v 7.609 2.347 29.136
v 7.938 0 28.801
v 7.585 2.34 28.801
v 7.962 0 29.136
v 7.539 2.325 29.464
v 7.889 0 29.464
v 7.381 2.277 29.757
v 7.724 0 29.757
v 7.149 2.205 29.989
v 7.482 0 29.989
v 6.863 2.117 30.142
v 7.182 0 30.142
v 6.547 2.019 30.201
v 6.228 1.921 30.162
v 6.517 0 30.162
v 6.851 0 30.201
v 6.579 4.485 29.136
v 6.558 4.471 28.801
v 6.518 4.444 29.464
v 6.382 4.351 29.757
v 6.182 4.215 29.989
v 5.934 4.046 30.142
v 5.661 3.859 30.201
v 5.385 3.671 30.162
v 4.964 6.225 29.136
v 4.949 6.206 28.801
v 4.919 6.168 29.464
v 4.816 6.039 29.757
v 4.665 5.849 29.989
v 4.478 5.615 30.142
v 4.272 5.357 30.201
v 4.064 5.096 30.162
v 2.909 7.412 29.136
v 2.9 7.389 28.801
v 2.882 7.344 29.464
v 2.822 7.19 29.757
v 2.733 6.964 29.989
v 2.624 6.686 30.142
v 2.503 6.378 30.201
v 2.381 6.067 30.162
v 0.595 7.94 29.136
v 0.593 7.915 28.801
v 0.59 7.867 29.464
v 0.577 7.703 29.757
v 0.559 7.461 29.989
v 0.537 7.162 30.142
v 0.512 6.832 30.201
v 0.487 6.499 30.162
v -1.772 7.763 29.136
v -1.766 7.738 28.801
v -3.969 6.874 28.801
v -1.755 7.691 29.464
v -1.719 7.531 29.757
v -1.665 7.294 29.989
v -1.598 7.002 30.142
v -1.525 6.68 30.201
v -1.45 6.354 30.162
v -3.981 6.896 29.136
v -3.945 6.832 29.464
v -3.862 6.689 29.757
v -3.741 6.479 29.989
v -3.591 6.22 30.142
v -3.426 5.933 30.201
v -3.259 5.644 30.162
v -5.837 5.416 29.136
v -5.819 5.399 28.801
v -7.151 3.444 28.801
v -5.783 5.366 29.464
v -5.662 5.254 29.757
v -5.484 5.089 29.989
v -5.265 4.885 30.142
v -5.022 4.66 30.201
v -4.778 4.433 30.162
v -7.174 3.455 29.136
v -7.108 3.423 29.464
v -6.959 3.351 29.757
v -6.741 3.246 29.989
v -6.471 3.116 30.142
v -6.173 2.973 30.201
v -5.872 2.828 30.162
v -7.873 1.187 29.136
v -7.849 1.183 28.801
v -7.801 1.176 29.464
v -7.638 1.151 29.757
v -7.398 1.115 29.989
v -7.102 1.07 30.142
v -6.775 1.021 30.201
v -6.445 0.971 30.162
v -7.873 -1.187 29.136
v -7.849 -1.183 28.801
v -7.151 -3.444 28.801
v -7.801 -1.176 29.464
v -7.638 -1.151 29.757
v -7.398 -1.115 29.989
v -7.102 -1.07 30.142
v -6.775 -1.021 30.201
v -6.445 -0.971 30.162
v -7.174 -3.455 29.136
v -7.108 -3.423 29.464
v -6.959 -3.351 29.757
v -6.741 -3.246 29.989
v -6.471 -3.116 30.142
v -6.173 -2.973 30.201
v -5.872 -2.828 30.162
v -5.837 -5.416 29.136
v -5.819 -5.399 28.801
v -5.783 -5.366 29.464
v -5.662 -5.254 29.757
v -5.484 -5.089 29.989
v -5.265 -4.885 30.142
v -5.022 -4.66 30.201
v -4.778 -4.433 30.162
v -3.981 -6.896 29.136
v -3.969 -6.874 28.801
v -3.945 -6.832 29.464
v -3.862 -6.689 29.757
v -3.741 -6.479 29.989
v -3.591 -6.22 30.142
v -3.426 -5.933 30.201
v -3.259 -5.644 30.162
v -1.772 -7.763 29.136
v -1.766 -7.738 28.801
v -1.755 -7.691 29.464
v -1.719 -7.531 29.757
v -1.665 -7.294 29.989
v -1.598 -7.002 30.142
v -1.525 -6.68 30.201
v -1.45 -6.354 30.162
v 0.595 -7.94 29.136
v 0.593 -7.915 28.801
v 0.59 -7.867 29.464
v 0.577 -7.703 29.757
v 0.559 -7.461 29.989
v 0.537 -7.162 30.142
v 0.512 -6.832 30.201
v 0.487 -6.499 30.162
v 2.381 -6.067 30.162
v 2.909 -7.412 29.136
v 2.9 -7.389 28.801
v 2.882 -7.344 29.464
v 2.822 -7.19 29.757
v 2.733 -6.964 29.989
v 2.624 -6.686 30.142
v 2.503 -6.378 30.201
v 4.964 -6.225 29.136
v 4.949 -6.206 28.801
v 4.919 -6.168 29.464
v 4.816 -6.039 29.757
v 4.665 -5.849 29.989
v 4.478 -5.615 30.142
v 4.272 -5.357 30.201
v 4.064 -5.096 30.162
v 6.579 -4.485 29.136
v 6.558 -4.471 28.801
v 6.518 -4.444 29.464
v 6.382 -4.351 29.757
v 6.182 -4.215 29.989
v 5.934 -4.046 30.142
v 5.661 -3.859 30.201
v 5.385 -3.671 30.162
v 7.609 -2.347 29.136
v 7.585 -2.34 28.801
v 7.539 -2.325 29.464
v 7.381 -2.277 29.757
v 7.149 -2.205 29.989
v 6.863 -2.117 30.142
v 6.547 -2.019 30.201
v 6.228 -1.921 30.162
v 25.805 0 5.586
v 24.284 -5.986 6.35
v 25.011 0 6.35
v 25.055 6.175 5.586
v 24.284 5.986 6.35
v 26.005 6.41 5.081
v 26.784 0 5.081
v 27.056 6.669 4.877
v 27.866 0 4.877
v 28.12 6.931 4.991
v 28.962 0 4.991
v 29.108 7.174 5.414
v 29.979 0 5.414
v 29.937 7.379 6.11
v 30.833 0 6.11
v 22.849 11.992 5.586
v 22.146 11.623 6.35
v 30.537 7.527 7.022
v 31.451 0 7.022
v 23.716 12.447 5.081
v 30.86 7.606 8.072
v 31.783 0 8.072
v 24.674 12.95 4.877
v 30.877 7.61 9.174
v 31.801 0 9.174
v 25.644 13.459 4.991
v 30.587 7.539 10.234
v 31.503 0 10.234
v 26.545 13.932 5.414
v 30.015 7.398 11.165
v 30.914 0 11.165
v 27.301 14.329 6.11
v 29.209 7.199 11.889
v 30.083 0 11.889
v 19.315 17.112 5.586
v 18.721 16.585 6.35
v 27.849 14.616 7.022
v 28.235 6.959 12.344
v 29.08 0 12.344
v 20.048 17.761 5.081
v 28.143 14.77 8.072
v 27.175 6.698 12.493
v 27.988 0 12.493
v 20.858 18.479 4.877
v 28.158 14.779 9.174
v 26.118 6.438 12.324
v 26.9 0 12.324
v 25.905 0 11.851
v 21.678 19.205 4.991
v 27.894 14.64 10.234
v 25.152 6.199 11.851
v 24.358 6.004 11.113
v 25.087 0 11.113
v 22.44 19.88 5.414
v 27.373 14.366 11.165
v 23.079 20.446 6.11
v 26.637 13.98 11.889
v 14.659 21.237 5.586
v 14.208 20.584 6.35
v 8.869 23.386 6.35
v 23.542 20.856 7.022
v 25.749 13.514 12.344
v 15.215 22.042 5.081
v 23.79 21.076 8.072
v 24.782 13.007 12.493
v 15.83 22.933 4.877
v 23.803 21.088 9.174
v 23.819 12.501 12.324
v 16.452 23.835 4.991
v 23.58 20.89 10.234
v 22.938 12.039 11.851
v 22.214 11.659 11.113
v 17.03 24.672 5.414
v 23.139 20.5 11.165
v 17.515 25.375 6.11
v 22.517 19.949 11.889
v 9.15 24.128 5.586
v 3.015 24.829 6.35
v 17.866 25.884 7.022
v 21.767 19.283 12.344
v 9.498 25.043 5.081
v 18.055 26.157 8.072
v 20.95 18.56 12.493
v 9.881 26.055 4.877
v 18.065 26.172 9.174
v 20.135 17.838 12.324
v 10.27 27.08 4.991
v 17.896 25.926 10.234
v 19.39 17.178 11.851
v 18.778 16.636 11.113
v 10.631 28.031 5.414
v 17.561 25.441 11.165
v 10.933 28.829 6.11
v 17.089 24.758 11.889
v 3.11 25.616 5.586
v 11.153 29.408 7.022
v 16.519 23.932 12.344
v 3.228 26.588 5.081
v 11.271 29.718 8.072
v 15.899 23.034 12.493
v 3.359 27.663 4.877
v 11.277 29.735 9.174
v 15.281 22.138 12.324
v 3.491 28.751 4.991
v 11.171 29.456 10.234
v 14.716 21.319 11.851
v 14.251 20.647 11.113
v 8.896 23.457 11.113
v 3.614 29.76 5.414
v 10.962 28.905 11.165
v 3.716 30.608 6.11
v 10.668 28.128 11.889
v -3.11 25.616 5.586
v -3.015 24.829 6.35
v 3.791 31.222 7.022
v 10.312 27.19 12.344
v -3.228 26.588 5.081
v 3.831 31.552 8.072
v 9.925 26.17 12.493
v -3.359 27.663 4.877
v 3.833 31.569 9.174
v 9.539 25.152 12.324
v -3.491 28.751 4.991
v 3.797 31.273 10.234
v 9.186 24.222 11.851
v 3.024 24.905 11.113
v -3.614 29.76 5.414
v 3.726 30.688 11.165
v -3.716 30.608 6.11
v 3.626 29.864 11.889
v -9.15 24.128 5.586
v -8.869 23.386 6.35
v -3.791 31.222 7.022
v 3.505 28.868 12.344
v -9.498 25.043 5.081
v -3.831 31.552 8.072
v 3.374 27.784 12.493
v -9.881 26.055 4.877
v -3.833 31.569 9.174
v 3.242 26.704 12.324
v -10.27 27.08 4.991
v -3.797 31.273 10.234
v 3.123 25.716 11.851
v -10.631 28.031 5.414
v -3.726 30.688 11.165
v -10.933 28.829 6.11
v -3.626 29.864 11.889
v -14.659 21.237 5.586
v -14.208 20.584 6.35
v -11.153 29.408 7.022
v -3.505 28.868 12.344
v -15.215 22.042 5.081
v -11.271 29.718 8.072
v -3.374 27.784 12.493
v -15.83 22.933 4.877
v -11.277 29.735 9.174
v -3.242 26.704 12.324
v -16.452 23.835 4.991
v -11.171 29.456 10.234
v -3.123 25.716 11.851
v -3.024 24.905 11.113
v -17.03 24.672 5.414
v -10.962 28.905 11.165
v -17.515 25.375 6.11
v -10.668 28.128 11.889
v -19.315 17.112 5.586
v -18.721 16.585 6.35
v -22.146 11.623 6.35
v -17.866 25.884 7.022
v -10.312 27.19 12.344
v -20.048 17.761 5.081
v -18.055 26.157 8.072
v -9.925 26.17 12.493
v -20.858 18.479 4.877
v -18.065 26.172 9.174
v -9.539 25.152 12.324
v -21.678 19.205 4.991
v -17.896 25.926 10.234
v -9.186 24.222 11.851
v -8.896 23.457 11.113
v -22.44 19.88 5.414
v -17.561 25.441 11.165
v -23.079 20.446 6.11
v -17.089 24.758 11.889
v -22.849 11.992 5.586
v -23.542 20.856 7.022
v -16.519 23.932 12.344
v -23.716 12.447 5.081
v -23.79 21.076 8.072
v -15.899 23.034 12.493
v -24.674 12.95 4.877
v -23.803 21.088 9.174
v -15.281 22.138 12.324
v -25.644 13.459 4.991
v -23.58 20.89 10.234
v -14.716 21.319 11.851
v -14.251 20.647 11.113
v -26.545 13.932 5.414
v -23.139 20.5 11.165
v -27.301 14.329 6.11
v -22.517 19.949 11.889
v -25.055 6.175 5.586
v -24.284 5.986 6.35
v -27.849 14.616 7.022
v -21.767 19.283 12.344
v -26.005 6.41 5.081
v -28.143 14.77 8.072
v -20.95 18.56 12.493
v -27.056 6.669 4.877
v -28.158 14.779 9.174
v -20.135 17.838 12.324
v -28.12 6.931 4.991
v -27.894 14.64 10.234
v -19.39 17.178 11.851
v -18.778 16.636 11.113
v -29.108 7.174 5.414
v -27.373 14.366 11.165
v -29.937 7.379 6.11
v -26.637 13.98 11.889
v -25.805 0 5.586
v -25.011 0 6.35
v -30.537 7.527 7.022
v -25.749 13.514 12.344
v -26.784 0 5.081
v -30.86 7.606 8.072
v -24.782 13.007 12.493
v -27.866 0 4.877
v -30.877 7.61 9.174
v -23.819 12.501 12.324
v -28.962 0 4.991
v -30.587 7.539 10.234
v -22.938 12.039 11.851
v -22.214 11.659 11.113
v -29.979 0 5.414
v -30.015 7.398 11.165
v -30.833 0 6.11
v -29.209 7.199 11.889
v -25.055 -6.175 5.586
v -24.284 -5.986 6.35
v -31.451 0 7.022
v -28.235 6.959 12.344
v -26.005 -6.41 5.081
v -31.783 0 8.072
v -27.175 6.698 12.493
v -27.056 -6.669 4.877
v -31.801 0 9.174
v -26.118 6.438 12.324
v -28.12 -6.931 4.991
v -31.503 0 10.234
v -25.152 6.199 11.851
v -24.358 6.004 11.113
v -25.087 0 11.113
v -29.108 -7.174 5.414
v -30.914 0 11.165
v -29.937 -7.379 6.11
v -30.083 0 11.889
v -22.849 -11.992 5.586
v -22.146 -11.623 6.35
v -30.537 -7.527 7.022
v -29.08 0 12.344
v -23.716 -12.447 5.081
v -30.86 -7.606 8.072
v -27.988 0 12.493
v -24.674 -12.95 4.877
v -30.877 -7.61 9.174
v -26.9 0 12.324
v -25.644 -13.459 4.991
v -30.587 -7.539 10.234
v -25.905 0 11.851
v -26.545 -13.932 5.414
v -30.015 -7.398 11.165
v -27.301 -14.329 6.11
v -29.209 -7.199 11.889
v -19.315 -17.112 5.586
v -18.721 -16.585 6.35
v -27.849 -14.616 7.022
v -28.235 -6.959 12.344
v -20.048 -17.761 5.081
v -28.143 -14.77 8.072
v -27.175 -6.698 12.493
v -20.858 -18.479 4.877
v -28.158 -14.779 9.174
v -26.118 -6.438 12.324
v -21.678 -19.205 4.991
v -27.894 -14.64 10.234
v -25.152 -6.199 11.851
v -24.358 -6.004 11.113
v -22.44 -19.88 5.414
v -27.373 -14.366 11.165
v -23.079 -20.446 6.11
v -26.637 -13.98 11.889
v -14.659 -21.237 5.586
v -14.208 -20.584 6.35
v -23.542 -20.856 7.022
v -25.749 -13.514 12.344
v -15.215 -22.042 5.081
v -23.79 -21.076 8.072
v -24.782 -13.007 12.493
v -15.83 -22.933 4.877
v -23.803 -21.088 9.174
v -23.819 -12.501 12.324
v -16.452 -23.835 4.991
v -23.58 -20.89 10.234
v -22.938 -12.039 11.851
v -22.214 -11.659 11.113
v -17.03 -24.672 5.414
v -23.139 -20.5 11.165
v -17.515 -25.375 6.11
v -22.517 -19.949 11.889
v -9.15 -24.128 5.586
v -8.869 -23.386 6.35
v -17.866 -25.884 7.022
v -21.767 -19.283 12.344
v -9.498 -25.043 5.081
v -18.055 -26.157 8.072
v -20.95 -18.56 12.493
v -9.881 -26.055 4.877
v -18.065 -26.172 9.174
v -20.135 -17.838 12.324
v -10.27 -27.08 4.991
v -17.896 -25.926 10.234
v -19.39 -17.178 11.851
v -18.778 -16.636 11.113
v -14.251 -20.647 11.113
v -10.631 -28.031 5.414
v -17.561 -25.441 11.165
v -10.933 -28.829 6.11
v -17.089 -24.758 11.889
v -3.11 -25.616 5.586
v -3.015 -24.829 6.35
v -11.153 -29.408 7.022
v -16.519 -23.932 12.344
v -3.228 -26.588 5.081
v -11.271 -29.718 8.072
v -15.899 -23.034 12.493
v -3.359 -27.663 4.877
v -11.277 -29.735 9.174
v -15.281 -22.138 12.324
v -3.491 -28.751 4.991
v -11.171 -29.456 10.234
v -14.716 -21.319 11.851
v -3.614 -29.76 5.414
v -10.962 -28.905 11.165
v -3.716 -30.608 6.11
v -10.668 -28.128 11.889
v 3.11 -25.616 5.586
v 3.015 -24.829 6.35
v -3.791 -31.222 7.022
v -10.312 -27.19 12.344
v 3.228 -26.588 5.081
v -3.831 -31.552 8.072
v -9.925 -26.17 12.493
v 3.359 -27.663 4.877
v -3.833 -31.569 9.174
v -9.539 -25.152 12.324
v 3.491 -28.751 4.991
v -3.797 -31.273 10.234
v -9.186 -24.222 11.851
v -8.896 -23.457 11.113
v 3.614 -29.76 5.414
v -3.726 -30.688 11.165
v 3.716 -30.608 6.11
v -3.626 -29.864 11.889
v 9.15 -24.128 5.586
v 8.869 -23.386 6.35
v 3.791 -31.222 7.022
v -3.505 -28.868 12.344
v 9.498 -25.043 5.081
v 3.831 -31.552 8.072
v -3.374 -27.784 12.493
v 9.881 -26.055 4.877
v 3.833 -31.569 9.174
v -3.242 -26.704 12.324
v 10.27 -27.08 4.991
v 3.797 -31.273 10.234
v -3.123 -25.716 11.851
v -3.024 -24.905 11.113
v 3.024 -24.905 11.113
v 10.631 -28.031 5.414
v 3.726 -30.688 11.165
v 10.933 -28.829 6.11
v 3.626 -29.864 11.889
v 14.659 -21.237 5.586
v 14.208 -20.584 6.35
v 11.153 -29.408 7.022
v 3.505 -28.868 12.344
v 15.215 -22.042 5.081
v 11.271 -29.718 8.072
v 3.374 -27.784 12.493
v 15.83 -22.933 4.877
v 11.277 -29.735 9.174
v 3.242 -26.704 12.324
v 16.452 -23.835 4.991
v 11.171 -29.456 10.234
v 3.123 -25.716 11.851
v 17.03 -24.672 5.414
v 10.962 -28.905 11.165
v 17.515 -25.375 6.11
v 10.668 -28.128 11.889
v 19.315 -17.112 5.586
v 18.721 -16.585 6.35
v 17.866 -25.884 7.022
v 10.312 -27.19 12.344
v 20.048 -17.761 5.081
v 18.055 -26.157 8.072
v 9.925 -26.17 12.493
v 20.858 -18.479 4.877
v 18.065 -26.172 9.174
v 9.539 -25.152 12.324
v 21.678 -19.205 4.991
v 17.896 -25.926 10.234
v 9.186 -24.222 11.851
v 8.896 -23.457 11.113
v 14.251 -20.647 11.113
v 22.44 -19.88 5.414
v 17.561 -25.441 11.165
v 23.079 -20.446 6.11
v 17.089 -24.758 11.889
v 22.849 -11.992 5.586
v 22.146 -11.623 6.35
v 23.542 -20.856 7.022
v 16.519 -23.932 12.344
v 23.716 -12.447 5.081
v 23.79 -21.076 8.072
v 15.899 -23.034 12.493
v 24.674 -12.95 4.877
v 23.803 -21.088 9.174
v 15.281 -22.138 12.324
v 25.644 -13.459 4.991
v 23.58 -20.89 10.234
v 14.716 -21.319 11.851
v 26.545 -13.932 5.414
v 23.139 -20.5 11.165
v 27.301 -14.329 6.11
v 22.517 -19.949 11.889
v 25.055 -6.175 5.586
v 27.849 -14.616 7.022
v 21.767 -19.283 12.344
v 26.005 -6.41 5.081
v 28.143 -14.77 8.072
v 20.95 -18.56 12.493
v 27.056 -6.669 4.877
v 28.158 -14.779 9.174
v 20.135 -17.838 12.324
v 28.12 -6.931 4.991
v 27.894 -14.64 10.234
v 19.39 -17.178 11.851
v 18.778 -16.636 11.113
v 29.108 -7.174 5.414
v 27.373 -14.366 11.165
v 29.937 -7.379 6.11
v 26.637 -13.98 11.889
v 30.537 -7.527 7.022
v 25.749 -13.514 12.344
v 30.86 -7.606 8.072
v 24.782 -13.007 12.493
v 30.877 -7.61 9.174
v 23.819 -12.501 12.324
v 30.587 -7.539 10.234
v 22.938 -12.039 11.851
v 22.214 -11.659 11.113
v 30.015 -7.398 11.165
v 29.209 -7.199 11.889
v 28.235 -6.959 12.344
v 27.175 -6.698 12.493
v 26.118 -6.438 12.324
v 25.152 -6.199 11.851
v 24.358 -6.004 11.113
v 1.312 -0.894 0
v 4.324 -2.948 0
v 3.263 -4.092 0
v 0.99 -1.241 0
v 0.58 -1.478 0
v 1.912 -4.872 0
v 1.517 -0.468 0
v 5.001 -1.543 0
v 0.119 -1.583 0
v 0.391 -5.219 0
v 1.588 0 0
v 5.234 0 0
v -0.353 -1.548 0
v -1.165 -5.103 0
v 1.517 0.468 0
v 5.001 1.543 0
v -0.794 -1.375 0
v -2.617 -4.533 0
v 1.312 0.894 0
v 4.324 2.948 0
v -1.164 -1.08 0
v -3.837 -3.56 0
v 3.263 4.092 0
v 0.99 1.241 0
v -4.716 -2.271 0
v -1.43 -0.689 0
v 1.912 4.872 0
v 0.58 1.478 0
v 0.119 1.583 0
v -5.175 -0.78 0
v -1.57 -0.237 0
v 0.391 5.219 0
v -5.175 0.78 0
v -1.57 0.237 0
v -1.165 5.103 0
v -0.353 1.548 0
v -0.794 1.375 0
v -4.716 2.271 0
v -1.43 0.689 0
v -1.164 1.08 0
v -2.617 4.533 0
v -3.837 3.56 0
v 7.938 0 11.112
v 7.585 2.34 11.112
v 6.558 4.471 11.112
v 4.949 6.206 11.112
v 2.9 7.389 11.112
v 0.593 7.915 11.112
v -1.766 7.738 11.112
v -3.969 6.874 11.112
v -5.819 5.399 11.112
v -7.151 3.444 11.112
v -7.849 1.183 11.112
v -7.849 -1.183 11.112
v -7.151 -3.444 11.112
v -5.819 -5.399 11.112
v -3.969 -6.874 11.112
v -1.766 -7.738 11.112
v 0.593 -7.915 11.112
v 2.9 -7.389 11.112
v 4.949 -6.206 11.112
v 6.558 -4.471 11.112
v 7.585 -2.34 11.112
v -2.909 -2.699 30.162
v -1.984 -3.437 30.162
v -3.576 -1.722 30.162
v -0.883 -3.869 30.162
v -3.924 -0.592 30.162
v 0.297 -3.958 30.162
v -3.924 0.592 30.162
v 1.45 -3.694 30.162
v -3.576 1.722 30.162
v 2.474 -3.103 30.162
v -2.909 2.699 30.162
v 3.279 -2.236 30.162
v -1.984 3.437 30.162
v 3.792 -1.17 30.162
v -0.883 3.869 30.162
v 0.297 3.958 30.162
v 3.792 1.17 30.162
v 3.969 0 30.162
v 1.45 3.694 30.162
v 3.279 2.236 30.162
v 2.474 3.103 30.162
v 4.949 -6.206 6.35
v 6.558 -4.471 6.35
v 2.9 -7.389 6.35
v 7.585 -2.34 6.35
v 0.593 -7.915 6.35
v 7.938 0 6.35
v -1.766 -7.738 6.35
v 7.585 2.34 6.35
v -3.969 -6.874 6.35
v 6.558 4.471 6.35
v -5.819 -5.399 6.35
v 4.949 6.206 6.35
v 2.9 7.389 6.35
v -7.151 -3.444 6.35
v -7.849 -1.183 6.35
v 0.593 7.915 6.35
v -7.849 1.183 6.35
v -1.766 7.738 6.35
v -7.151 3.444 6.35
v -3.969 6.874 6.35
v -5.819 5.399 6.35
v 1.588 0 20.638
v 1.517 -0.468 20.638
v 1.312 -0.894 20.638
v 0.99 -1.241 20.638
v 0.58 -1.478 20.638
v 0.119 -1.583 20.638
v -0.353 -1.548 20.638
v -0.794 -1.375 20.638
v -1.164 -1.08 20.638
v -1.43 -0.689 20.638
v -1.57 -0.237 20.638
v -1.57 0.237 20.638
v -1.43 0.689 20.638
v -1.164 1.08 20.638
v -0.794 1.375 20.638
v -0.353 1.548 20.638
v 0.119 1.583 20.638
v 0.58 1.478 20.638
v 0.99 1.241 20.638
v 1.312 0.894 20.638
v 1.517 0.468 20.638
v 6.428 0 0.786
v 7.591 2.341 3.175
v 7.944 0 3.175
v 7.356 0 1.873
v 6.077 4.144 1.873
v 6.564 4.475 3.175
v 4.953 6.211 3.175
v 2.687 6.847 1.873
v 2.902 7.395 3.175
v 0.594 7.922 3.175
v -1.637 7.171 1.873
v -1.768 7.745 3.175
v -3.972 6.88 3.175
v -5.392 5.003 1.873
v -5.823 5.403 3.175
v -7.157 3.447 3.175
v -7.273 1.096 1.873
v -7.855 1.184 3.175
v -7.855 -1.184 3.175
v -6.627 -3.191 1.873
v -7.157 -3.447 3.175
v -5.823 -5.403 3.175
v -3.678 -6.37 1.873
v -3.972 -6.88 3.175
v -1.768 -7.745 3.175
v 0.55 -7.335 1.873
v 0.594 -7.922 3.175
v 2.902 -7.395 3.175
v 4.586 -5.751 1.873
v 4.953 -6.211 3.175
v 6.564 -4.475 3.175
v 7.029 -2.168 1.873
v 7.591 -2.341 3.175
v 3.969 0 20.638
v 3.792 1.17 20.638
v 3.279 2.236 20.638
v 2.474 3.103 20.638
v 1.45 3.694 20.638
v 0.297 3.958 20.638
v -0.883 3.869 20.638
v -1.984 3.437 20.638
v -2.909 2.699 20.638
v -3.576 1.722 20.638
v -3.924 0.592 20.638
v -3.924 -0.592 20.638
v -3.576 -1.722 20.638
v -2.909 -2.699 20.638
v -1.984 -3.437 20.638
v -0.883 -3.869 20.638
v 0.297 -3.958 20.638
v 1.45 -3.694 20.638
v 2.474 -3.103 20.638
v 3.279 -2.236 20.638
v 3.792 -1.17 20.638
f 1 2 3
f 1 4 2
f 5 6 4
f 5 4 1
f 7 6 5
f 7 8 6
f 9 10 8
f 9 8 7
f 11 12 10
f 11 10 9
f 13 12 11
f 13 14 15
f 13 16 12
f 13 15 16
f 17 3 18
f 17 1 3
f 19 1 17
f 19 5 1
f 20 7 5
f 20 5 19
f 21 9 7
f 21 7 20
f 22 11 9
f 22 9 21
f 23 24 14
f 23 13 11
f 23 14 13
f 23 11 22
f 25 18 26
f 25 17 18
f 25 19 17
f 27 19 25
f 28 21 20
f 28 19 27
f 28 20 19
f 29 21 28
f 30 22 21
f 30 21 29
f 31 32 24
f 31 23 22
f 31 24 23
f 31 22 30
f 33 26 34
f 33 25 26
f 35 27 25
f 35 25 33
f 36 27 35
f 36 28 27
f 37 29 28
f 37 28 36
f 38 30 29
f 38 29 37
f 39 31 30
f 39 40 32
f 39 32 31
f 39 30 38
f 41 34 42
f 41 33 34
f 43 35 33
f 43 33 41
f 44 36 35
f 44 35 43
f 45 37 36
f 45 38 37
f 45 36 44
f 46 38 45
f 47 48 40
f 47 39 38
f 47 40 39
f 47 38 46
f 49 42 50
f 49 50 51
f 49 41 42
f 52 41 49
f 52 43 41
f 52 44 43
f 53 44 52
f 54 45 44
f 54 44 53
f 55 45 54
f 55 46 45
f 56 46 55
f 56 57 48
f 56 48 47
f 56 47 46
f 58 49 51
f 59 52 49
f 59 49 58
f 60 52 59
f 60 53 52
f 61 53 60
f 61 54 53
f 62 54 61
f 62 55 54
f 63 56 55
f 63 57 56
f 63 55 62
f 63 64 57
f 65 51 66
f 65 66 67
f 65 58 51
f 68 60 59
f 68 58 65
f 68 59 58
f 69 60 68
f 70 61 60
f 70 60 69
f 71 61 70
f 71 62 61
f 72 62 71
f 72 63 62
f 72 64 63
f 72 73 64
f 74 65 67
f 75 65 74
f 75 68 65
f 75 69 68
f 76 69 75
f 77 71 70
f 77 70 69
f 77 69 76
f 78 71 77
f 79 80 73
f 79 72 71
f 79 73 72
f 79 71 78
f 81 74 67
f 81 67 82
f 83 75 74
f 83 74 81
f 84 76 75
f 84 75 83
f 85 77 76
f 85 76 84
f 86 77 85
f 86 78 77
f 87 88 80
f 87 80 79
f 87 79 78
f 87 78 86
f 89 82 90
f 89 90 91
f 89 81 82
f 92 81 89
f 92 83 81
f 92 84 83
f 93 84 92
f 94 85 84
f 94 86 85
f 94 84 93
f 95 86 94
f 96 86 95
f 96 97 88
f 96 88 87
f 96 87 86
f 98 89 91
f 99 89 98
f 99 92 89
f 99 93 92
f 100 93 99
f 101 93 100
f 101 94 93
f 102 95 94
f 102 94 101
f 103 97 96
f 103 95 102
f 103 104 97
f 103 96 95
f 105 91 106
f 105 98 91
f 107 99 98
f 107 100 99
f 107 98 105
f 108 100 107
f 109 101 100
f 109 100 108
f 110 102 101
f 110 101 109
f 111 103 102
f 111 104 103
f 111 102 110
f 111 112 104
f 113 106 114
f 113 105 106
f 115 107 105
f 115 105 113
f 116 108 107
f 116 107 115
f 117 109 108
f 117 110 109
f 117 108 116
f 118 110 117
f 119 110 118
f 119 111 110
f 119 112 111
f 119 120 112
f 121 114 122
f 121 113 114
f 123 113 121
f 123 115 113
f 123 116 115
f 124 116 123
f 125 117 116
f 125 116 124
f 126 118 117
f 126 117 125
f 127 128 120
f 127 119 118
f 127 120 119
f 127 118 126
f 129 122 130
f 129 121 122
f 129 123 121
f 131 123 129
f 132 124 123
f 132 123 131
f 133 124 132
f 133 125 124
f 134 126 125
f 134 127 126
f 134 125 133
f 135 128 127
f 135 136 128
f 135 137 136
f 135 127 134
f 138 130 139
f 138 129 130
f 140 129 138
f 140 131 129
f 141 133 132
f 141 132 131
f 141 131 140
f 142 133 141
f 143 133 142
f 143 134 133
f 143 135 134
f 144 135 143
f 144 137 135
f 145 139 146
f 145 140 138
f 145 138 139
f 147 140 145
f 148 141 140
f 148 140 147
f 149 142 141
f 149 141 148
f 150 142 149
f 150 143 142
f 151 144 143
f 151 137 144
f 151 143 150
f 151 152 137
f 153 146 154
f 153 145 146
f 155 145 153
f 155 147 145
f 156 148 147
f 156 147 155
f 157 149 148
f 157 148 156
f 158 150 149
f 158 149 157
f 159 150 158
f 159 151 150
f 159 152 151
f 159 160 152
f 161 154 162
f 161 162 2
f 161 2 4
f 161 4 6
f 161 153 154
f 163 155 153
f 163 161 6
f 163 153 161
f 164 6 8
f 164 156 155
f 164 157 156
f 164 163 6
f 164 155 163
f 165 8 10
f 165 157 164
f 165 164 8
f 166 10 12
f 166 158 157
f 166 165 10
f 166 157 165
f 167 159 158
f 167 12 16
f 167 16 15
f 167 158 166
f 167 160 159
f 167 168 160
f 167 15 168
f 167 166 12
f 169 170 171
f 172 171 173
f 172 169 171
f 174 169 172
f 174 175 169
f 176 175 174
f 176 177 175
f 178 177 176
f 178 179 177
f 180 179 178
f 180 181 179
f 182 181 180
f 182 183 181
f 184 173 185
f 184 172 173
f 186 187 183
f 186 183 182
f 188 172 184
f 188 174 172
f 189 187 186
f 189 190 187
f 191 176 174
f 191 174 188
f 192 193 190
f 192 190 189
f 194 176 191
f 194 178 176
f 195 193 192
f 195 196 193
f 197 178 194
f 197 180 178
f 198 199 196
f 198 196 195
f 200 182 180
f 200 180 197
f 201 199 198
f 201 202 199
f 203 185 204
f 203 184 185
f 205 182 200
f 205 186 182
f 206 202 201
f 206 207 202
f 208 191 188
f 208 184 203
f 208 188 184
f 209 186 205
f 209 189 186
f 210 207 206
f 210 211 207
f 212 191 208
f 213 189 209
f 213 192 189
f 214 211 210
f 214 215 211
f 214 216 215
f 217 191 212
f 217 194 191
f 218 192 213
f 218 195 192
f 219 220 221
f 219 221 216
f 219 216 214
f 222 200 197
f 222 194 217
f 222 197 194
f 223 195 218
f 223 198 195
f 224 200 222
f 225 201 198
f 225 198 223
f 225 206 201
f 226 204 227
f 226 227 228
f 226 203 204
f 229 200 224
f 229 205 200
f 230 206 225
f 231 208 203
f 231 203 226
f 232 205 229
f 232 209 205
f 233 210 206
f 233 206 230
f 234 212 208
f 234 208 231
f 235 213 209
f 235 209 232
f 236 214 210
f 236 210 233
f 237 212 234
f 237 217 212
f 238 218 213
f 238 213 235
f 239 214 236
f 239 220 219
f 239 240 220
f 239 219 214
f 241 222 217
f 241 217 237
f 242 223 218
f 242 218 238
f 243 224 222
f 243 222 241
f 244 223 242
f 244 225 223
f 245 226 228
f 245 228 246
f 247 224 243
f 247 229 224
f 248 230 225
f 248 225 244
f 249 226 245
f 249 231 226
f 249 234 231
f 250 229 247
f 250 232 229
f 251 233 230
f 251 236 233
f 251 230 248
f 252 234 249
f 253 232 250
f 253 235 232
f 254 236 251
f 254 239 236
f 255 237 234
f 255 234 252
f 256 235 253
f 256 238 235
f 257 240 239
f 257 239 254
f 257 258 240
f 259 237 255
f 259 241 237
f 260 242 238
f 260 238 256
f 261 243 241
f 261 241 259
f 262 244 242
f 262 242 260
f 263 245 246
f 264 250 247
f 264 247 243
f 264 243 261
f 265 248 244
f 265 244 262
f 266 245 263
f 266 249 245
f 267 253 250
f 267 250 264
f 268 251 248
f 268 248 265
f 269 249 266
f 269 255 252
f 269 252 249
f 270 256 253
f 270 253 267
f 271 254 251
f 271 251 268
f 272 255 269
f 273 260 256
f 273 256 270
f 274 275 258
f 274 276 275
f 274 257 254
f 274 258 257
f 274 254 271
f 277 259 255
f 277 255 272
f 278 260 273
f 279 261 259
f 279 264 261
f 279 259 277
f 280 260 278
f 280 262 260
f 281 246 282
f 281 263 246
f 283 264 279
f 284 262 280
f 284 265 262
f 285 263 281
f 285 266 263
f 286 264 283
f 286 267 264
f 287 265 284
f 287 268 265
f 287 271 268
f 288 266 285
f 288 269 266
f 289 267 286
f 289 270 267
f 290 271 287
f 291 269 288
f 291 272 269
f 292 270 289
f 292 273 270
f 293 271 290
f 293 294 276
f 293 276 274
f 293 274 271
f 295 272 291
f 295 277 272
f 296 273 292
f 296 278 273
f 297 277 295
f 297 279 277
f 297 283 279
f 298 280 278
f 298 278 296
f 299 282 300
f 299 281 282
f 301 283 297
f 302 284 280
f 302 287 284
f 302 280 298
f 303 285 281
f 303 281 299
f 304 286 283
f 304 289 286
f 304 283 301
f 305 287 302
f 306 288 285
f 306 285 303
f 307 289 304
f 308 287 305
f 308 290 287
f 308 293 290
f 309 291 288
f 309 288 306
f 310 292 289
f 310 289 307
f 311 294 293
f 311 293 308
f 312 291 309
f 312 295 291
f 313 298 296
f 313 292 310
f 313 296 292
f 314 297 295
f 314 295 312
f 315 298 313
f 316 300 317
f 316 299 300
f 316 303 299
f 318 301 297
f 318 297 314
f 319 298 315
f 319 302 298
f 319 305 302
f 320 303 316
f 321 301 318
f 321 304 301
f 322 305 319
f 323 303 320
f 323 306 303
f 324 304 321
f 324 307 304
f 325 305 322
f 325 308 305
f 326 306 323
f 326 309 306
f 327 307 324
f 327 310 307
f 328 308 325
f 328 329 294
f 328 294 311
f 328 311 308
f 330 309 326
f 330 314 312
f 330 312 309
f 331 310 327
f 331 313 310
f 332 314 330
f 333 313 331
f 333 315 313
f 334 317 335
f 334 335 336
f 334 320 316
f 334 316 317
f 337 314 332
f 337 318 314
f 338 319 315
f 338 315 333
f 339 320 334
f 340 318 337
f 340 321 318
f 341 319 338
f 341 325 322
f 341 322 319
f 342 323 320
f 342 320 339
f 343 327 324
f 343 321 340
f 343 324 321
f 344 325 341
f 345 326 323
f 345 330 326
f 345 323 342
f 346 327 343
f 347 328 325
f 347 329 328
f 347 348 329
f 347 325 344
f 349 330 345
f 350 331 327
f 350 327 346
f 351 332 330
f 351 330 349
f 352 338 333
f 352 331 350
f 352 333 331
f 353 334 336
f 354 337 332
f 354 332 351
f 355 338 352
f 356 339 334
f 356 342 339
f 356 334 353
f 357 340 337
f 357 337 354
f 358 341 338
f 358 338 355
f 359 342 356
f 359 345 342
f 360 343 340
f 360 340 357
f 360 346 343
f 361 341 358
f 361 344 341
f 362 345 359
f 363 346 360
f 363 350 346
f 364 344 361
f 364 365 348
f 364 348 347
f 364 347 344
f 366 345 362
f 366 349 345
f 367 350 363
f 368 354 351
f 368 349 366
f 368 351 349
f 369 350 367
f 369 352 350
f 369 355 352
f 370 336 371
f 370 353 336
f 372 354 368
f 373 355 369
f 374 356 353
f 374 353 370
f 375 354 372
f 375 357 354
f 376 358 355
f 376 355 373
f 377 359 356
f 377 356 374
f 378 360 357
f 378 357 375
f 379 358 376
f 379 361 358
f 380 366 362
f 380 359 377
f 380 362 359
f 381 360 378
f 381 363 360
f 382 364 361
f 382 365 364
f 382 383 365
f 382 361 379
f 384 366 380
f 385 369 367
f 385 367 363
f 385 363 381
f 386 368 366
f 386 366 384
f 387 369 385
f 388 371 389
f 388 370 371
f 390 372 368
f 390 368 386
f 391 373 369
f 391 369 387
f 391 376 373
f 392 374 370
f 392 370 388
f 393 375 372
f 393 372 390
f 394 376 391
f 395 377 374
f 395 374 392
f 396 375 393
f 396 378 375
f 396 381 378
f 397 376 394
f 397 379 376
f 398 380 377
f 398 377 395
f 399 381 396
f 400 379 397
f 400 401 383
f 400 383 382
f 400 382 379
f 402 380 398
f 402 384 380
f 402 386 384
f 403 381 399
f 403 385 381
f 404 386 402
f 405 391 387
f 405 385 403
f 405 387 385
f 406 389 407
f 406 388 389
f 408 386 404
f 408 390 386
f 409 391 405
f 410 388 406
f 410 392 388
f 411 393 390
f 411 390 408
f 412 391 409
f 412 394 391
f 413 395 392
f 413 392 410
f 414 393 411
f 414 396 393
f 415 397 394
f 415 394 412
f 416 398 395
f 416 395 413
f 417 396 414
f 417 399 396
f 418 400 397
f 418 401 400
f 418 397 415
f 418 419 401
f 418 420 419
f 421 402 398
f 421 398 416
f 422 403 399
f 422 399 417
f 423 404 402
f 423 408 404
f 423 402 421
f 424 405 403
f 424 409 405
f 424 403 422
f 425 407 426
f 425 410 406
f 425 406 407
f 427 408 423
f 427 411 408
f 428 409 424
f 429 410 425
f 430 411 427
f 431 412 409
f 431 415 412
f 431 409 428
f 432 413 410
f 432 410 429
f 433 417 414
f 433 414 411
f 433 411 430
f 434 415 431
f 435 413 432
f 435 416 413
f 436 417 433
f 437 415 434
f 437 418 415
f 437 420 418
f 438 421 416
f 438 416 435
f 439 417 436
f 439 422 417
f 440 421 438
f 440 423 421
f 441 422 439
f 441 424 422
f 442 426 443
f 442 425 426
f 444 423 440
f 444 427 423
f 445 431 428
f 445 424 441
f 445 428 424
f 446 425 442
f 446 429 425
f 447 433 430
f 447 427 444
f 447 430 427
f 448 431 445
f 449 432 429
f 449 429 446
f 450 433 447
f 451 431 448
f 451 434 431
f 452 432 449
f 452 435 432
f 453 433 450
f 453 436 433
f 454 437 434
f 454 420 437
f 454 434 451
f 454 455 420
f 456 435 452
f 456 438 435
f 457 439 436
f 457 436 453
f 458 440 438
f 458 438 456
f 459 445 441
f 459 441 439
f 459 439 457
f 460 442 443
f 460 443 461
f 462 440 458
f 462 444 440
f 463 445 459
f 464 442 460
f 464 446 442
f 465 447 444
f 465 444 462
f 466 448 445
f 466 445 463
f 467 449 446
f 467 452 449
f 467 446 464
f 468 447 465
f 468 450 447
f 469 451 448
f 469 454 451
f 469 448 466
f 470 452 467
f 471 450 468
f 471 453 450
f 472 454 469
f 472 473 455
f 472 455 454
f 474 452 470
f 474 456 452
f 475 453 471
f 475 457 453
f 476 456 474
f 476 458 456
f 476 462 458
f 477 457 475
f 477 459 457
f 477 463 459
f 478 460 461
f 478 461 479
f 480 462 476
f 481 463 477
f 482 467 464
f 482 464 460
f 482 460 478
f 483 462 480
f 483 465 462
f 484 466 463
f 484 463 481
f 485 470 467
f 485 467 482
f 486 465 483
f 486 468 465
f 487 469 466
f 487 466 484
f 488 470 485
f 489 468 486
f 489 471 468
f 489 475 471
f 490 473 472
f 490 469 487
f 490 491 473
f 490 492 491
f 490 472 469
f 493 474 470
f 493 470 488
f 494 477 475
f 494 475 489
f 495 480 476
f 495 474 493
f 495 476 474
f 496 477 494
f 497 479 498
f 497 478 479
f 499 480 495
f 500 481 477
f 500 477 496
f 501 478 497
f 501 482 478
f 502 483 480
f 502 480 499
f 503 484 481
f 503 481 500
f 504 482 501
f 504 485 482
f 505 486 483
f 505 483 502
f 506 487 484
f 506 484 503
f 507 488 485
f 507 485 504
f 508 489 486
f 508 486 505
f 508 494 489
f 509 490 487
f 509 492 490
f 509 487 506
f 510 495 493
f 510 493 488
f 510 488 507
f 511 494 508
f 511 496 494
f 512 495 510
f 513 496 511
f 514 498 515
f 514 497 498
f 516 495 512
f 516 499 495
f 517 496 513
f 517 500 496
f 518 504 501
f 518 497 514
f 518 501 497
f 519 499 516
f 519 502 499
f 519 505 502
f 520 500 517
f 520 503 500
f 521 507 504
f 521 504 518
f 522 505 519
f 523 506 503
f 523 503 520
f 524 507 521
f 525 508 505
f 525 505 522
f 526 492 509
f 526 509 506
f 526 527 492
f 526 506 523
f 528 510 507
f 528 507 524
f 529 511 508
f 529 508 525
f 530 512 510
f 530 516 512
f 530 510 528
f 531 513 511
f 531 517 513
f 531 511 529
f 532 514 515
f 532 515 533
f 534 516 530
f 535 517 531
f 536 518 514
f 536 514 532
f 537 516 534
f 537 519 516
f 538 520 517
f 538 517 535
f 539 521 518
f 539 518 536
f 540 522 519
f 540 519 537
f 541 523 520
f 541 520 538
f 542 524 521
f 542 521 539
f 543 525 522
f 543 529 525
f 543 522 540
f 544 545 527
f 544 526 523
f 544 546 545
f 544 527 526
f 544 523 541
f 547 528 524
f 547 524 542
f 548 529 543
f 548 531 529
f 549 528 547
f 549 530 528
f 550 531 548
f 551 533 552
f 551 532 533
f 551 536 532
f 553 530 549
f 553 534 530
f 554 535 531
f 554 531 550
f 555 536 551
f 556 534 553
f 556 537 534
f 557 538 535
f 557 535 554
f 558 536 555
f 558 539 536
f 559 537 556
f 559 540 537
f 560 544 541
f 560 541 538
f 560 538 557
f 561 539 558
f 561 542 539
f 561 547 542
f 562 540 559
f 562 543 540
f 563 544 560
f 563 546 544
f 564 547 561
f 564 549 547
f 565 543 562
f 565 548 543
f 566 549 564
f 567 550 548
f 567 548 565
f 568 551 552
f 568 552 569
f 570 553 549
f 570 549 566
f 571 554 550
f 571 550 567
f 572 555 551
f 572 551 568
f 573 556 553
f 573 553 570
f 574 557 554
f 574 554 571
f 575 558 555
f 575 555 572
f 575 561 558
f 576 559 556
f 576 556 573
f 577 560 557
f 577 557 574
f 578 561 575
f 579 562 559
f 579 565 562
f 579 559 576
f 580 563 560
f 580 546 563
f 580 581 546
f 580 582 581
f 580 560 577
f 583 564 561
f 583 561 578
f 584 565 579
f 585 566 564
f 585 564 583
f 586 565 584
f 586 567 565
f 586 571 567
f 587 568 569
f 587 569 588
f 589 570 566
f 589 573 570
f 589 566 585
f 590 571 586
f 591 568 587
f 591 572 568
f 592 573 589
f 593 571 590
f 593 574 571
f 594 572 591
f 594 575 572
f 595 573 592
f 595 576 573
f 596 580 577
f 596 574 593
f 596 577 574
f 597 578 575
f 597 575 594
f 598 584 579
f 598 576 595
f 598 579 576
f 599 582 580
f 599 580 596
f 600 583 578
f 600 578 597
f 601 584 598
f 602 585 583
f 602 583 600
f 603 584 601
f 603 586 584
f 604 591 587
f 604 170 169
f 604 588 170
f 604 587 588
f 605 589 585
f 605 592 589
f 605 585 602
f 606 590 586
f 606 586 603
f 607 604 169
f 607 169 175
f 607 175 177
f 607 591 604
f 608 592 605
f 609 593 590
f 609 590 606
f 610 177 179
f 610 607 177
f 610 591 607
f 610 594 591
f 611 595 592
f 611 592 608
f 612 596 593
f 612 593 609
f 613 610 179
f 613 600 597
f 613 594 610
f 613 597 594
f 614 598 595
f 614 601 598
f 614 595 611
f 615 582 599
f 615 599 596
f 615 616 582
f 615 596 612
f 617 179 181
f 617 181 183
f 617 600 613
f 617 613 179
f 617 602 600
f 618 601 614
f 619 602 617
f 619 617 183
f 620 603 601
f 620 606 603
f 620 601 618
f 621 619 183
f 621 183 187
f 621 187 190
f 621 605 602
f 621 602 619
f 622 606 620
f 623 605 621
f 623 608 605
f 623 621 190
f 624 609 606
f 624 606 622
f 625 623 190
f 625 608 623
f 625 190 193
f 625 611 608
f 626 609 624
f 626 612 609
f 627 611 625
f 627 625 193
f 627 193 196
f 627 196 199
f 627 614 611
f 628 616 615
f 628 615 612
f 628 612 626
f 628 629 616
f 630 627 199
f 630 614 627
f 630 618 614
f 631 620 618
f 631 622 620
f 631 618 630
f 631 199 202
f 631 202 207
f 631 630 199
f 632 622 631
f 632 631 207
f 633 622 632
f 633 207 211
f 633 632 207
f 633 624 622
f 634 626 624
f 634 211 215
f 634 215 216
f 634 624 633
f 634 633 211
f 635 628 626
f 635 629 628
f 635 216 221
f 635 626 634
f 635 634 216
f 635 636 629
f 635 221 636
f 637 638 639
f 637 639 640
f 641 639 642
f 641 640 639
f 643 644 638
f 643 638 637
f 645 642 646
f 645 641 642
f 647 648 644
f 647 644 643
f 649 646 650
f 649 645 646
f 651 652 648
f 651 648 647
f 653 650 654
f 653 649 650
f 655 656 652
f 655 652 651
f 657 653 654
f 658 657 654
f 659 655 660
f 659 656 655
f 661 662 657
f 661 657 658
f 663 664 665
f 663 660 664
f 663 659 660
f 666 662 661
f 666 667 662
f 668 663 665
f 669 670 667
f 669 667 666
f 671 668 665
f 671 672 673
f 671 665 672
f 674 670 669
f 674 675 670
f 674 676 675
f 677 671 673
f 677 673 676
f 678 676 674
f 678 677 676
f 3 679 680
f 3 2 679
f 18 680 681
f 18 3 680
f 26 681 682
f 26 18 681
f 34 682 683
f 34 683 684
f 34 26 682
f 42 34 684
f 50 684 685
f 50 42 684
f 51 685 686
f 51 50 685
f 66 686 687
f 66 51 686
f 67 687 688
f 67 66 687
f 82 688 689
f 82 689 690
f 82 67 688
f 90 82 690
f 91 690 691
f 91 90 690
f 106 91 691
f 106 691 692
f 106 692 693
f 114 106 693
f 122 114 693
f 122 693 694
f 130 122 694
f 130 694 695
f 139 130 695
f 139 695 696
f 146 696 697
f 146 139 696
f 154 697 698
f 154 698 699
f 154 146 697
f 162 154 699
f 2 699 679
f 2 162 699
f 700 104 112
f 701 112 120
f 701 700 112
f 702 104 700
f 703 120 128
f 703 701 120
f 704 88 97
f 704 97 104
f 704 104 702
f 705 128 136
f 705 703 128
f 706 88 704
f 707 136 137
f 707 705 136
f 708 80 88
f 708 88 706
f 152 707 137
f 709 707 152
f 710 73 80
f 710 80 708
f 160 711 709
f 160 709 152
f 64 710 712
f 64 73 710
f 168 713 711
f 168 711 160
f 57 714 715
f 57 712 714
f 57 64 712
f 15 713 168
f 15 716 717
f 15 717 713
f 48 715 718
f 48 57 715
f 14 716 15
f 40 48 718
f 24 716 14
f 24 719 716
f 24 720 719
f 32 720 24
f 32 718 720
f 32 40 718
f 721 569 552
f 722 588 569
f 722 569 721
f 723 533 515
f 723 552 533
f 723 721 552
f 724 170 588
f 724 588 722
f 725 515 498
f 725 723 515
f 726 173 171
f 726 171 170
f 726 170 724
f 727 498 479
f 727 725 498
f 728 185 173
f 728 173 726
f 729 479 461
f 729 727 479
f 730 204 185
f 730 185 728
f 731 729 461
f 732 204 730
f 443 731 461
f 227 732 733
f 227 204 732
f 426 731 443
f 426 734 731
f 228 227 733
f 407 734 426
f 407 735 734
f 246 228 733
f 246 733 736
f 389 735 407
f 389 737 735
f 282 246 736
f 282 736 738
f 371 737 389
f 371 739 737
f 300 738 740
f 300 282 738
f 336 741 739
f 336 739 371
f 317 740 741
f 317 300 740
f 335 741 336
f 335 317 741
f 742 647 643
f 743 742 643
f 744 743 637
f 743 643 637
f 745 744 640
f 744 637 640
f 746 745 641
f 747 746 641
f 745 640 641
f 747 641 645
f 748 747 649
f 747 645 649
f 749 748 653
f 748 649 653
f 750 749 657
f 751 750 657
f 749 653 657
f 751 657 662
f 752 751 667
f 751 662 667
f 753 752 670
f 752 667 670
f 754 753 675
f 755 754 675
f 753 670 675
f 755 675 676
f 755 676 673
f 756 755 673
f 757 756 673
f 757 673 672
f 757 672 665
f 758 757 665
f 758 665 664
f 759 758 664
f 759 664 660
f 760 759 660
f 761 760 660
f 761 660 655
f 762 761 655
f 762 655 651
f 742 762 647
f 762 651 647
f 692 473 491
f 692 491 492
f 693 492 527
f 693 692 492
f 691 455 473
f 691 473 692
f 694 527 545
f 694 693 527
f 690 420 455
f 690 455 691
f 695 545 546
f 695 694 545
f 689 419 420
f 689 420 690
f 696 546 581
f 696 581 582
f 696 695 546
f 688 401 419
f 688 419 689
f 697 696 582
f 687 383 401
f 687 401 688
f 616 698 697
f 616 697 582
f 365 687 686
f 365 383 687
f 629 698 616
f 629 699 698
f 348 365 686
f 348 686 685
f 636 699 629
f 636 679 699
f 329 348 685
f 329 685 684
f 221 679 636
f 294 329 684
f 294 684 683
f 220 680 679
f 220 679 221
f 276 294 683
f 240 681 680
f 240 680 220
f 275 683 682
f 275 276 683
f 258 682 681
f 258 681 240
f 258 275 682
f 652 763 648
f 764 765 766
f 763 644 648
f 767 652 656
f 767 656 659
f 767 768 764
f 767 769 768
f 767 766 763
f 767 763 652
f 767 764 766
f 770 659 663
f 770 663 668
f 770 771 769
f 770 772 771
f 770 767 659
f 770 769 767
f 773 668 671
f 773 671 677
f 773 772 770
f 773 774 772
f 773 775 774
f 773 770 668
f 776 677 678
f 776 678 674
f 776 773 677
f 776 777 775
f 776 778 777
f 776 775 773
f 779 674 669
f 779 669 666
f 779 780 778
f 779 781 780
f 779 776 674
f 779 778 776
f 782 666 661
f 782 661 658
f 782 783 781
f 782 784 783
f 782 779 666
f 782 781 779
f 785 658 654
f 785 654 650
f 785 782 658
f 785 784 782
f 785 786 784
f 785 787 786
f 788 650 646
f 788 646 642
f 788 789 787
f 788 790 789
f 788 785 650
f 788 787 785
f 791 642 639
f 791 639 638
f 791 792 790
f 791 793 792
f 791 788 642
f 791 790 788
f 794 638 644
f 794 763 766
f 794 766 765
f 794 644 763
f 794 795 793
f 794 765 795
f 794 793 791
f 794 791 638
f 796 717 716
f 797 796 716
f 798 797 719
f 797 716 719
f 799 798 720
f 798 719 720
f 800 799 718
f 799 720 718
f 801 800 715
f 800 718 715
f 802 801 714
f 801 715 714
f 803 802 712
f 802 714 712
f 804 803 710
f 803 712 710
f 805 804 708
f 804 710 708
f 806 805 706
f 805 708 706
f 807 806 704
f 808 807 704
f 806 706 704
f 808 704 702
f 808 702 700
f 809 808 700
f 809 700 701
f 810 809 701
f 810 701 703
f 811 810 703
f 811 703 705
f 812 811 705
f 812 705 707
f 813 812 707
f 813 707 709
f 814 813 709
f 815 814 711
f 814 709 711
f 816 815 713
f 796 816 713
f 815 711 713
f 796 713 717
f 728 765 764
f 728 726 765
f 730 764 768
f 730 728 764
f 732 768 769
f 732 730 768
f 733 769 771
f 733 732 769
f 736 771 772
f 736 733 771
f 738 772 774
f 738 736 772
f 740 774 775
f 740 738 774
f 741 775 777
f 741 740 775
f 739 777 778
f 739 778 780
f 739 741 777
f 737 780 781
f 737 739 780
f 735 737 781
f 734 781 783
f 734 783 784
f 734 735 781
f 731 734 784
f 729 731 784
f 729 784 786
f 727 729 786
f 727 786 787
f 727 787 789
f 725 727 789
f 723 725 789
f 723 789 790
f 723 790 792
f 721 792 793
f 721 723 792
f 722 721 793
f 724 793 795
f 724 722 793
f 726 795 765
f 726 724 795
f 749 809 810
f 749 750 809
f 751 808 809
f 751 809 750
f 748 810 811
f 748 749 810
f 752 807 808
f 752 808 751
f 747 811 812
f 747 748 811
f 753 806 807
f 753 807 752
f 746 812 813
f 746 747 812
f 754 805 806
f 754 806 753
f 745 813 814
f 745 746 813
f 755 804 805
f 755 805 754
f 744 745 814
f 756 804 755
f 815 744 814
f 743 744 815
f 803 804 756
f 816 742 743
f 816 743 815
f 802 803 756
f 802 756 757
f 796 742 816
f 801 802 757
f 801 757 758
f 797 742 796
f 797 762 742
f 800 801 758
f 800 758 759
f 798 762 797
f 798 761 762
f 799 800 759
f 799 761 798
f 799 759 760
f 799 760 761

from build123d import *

# Parameters (mm, degrees)
F2_R     = 3.96875
F3_DEPTH = 9.525
F4_R     = 1.5875
F5_DEPTH = 20.6375


# Not quite as in the source:
# - a length typed as a fraction of an inch, garbled in the dataset ("3 / 203.2 mm" for 3/8 in), is restored


with BuildPart() as f1:
    # F0 (on Front) → F1 (revolve)
    with BuildSketch(Plane.XZ):
        with BuildLine():
            Line((0, 30.1625), (0, 0))
            Line((0, 0), (5.2339527756, 0))
            ThreePointArc((5.2339527756, 0), (6.9300739719, 1.2963017107), (7.94385, 3.17499365))
            Line((7.94385, 3.17499365), (7.9375, 6.3499873))
            Line((7.9375, 6.3499873), (25.0110084837, 6.3499873))
            ThreePointArc((25.0110084837, 6.3499873), (31.8322699863, 8.6224170081), (25.0874177301, 11.1125))
            Line((25.0874177301, 11.1125), (7.9375, 11.1125))
            Line((7.9375, 11.1125), (7.9375, 28.8007091731))
            ThreePointArc((7.9375, 28.8007091731), (7.6114687199, 29.8820156927), (6.517462898, 30.1625))
            Line((6.517462898, 30.1625), (0, 30.1625))
        make_face()
    revolve(axis=Axis((0, 0, 15.08125), (0, 0, 1)))

    # F2 (on face) → F3 (cut)
    with BuildSketch(Plane.XY.offset(30.1625)):
        Circle(F2_R)
    extrude(amount=-F3_DEPTH, mode=Mode.SUBTRACT)

    # F4 (on face) → F5 (cut)
    with BuildSketch(Plane(origin=(0, 0, 0), x_dir=(1, 0, 0), z_dir=(0, 0, -1))):
        Circle(F4_R)
    extrude(amount=-F5_DEPTH, mode=Mode.SUBTRACT)


solid = f1.part
